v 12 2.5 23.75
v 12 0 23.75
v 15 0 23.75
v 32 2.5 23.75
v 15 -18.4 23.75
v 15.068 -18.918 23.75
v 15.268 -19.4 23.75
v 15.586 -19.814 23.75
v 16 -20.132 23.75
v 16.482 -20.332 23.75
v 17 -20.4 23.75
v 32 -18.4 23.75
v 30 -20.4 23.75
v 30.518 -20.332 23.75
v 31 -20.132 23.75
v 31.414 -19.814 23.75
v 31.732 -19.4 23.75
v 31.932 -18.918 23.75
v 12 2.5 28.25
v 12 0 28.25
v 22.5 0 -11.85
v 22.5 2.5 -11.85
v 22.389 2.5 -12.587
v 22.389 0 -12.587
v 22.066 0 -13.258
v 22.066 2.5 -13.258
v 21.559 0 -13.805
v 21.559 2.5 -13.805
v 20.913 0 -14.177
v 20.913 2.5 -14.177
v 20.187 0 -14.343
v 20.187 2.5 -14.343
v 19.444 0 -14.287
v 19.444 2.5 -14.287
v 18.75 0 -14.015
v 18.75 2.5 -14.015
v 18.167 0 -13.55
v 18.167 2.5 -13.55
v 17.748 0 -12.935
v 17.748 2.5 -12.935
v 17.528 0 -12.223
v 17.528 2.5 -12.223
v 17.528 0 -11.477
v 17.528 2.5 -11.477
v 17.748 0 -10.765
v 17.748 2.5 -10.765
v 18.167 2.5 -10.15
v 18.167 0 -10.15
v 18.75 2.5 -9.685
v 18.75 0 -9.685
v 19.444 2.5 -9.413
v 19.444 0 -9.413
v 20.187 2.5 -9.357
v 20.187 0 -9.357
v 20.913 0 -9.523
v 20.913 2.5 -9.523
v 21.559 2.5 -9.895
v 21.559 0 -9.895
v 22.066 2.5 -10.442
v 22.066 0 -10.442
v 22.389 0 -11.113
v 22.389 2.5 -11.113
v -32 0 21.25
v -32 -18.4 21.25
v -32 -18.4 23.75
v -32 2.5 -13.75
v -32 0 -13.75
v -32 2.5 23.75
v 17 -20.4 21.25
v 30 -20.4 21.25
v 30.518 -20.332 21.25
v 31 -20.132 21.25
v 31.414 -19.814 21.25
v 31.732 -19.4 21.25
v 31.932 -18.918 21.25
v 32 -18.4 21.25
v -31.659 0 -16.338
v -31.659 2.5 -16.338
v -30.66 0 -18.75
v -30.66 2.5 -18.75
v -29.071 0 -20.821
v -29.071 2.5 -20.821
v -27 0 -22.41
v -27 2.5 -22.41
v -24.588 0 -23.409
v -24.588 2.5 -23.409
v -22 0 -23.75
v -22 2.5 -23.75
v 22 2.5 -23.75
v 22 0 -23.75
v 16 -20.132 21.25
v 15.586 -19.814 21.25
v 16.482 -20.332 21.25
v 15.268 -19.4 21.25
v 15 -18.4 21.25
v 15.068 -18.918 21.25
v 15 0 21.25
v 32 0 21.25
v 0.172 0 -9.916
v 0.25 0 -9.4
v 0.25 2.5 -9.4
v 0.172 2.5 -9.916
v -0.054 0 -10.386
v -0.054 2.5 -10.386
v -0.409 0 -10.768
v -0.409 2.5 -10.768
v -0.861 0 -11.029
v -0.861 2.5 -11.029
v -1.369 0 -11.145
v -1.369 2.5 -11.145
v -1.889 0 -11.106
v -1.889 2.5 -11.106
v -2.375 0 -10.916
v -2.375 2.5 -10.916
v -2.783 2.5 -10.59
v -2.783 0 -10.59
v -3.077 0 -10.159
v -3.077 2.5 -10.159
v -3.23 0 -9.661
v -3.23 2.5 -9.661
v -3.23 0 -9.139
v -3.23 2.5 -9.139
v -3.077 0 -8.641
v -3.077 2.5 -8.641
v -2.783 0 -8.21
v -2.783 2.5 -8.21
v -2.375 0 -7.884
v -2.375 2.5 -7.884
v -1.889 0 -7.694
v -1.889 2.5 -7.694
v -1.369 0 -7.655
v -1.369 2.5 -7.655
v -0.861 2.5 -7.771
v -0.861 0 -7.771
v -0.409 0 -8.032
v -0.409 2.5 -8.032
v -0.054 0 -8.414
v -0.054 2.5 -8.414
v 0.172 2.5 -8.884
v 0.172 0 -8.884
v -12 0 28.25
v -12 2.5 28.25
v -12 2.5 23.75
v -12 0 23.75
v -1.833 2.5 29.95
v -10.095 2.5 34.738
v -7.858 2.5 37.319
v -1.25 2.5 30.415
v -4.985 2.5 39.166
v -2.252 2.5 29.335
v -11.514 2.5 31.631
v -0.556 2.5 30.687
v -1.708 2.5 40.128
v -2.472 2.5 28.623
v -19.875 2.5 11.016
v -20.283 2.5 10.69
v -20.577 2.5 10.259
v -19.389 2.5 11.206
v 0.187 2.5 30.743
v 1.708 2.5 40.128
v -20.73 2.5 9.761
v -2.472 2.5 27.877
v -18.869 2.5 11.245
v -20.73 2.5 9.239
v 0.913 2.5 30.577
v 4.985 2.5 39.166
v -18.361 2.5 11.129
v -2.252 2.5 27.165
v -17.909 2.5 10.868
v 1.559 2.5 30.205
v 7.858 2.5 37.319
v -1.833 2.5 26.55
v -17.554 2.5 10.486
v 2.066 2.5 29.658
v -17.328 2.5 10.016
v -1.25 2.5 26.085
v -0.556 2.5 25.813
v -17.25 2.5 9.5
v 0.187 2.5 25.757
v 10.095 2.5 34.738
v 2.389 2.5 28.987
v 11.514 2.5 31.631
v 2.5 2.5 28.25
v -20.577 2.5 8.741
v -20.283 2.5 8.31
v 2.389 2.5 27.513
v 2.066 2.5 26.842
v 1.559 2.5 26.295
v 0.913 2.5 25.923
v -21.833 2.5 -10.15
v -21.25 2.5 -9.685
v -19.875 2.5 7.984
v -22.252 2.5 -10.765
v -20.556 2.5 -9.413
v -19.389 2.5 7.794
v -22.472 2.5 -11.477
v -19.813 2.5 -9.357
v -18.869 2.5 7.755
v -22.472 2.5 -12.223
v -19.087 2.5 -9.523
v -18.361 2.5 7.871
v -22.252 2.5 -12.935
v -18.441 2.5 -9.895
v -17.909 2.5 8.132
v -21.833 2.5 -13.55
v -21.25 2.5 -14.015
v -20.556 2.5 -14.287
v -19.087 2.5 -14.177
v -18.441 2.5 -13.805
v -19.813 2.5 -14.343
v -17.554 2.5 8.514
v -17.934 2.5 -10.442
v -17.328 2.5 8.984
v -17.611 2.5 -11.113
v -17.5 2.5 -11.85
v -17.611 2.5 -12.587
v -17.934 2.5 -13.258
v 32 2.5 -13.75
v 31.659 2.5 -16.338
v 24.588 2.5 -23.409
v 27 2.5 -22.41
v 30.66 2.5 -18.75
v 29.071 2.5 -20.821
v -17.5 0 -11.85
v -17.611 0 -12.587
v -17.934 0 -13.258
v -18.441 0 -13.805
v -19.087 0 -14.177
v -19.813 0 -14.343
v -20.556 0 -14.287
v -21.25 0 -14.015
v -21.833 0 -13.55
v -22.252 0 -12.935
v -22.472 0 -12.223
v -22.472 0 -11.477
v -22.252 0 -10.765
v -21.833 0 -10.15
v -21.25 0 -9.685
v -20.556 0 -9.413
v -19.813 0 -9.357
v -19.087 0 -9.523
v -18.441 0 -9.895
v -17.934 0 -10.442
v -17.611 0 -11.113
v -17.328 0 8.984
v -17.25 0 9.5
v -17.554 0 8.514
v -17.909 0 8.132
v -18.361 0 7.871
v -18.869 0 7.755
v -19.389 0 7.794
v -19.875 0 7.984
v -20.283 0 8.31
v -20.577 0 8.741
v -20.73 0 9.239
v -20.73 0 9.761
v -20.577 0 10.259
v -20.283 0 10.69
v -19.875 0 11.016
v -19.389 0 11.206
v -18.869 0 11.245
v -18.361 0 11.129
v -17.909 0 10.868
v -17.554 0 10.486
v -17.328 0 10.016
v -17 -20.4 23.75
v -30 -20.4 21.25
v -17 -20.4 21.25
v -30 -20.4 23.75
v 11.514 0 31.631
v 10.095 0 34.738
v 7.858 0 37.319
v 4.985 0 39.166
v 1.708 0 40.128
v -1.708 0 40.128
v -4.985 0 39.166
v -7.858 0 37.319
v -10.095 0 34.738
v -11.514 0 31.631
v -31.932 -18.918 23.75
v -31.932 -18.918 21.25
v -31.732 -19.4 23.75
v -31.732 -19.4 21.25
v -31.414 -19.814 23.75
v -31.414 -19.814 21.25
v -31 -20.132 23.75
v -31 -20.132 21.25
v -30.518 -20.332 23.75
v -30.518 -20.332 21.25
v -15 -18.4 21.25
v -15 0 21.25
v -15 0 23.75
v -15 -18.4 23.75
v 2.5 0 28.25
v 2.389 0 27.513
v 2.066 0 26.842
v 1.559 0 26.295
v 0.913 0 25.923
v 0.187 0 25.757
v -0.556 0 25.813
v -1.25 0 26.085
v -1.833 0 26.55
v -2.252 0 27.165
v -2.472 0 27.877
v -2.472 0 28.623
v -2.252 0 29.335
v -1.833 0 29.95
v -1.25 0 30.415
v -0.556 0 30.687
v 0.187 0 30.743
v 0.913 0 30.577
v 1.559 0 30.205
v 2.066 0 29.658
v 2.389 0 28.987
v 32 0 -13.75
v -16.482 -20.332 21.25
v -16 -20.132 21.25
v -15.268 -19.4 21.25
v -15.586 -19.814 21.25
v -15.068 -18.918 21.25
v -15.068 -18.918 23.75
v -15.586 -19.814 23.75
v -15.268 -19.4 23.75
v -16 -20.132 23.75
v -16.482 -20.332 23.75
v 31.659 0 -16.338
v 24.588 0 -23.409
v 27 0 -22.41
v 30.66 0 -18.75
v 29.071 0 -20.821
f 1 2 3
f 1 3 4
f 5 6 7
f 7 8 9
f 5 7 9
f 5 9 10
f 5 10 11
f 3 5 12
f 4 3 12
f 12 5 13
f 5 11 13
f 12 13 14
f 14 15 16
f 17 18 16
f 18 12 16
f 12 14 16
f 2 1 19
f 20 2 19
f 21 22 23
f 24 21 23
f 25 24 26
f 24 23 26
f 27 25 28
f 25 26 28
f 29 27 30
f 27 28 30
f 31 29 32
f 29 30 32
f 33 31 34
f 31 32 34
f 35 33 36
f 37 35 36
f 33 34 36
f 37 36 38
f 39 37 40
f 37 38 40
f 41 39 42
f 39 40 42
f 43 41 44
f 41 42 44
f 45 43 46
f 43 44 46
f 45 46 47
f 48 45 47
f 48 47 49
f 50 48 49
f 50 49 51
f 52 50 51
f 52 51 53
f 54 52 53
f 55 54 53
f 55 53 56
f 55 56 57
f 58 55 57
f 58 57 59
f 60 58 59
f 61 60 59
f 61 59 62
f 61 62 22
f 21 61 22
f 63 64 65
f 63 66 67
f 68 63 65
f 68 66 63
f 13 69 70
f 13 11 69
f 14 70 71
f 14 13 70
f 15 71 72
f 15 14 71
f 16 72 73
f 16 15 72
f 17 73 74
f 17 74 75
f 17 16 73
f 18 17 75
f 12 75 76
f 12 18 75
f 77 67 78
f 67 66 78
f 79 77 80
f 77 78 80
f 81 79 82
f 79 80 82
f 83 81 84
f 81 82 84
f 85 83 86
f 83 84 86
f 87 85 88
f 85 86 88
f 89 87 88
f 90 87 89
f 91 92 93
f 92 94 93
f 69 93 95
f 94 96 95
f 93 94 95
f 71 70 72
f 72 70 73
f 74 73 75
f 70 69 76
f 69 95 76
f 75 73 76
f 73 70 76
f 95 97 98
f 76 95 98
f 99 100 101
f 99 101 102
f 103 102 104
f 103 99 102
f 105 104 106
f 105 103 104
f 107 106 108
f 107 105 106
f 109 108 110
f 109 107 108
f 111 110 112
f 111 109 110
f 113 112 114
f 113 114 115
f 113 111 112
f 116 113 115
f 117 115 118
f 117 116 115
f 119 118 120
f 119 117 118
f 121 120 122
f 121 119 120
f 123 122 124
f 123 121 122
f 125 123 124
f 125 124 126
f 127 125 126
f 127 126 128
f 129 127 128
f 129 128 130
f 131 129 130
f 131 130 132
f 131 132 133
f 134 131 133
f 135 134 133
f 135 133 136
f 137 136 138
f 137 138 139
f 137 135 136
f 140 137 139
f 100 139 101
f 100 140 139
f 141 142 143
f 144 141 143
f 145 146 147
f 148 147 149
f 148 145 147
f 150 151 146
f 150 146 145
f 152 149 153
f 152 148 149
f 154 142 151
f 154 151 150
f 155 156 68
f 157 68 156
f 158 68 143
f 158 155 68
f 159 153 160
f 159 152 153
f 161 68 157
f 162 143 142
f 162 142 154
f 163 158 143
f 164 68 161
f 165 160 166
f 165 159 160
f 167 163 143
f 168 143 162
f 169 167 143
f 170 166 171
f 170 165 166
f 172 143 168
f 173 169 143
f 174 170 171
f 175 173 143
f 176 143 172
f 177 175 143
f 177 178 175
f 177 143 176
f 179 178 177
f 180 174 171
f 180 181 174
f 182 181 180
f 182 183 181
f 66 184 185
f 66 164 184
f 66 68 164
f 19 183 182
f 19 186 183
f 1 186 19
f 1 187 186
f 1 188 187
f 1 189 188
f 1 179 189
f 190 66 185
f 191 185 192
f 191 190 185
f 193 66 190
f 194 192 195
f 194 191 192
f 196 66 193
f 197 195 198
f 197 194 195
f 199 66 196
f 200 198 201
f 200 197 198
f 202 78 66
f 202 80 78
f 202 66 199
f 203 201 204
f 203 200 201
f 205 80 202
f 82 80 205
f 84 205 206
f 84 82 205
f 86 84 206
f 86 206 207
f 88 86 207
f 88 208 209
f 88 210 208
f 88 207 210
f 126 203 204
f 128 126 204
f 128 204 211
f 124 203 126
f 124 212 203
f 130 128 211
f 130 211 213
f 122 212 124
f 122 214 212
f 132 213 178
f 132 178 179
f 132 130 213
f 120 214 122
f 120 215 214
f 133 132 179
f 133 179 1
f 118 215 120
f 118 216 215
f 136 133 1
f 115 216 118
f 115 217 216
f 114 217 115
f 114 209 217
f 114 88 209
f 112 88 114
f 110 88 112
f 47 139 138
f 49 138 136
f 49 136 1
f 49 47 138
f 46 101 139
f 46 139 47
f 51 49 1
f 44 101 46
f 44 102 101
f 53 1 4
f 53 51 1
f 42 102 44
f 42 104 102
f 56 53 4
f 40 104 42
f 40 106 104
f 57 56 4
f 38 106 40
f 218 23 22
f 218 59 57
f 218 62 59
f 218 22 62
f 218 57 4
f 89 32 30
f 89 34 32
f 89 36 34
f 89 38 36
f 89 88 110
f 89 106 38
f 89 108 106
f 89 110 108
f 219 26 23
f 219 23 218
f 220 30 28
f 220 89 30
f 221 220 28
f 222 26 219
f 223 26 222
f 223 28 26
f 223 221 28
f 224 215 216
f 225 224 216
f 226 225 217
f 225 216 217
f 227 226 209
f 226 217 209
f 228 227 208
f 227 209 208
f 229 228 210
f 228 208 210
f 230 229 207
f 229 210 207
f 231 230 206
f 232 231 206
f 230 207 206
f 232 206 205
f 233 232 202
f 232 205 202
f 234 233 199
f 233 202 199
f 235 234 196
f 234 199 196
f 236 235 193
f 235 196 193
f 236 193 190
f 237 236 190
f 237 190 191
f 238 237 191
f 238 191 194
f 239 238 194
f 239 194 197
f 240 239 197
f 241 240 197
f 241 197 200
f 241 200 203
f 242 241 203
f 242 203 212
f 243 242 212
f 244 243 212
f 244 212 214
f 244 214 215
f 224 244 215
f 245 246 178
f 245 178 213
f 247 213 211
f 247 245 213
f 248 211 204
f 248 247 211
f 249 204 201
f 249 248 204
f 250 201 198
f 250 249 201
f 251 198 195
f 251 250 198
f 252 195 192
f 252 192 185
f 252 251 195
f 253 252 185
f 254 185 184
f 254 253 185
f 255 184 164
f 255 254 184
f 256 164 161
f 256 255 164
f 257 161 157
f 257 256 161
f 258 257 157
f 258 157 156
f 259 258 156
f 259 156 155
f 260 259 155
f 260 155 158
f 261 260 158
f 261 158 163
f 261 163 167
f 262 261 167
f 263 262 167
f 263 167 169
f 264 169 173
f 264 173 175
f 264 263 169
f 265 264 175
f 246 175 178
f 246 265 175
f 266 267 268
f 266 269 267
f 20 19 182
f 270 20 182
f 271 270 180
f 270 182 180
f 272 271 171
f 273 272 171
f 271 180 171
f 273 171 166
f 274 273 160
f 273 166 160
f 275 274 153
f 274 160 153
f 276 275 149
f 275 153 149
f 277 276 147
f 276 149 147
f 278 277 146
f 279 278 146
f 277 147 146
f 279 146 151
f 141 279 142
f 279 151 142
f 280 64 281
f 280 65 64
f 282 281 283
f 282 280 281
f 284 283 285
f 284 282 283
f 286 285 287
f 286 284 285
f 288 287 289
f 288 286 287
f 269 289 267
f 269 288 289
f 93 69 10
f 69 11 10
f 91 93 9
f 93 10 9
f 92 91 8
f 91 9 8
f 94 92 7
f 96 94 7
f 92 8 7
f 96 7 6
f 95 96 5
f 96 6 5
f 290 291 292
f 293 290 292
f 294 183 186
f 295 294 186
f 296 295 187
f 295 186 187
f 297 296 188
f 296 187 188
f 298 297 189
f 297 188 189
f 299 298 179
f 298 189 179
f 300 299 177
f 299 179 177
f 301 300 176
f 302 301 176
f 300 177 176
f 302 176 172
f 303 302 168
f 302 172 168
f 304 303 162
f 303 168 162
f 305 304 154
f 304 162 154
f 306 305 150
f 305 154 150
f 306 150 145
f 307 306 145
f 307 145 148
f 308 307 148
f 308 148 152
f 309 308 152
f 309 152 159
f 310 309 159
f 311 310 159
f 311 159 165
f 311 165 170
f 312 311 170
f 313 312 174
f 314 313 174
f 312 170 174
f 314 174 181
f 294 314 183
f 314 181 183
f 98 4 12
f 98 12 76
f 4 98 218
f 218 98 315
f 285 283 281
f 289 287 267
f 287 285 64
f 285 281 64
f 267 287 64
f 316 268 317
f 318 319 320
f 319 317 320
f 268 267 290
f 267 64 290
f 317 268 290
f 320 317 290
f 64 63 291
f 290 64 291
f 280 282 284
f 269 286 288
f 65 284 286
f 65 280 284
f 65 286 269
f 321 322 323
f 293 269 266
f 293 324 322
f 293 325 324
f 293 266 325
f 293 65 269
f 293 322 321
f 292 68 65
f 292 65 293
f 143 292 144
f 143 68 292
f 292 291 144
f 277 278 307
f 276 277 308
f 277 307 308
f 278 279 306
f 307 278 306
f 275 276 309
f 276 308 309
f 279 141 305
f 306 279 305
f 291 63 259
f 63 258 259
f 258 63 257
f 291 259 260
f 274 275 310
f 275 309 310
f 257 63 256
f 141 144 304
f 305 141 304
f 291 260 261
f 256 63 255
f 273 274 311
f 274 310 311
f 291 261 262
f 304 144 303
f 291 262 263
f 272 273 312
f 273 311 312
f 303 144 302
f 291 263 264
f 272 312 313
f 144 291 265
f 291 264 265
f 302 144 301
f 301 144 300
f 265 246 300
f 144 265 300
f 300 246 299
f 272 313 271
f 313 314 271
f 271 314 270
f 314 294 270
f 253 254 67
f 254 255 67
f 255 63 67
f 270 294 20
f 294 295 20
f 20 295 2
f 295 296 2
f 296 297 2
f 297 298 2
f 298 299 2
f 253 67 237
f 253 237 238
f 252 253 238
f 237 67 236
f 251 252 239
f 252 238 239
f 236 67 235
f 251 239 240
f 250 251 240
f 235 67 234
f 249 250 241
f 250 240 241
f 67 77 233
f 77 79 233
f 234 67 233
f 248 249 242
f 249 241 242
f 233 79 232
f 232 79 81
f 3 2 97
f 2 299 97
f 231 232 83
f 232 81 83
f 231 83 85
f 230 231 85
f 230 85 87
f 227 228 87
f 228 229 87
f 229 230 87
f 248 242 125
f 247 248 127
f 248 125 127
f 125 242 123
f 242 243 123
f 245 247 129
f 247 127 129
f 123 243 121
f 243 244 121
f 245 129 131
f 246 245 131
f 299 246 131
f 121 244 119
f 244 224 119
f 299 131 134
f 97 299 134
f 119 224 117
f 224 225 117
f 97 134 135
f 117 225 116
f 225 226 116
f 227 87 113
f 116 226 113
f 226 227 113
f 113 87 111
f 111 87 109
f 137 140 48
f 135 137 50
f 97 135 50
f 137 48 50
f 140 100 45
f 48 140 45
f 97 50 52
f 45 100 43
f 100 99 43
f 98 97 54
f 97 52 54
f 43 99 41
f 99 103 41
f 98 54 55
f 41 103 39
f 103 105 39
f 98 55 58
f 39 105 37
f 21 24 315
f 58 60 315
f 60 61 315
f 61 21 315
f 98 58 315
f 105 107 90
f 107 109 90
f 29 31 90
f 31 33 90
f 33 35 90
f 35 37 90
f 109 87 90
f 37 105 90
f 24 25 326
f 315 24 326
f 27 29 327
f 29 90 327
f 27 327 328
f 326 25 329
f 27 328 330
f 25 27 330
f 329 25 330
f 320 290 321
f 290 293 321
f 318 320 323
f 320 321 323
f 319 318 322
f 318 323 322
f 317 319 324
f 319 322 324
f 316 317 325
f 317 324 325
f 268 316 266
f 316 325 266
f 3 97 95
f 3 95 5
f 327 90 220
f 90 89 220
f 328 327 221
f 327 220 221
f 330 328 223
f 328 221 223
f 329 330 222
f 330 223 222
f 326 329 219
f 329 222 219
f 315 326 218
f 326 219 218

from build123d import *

# Parameters (mm, degrees)
SKETCH2_W           = 64
SKETCH2_H           = 47.5
SKETCH2_R           = 1.75
BOSS_EXTRUDE1_DEPTH = 2.5
FILLET1_R           = 10
SKETCH3_R           = 2.5
BOSS_EXTRUDE2_DEPTH = 2.5
SKETCH4_W           = 17
SKETCH4_H           = 2.5
BOSS_EXTRUDE3_DEPTH = 20.4
FILLET2_R           = 2
SKETCH5_R           = 2.5
CUT_EXTRUDE1_DEPTH  = 23.9


with BuildPart() as part:
    # Sketch2 → Boss-Extrude1 (new body)
    with BuildSketch(Plane(origin=(0, 0, 0), x_dir=(1, 0, 0), z_dir=(0, 1, 0))):
        Rectangle(SKETCH2_W, SKETCH2_H)
        with Locations((-1.5, 9.4)):
            Circle(SKETCH2_R, mode=Mode.SUBTRACT)
        with Locations((-19, -9.5)):
            Circle(SKETCH2_R, mode=Mode.SUBTRACT)
    extrude(amount=BOSS_EXTRUDE1_DEPTH)

    # Fillet1
    fillet1_edges = [part.edges().sort_by_distance(p)[0] for p in [
        (-32, 1.25, -23.75),
        (32, 1.25, -23.75),
    ]]
    fillet(fillet1_edges, radius=FILLET1_R)

    # Sketch3 → Boss-Extrude2 (add)
    with BuildSketch(Plane(origin=(0, 2.5, 0), x_dir=(1, 0, 0), z_dir=(0, 1, 0))):
        with BuildLine():
            Line((-12, -28.25), (-12, -23.75))
            Line((-12, -23.75), (12, -23.75))
            Line((12, -23.75), (12, -28.25))
            ThreePointArc((12, -28.25), (0, -40.25), (-12, -28.25))
        make_face()
        with Locations((0, -28.25)):
            Circle(SKETCH3_R, mode=Mode.SUBTRACT)
    extrude(amount=-BOSS_EXTRUDE2_DEPTH)

    # Sketch4 → Boss-Extrude3 (add)
    with BuildSketch(Plane.XZ):
        with Locations((-23.5, 22.5)):
            Rectangle(SKETCH4_W, SKETCH4_H)
        with Locations((23.5, 22.5)):
            Rectangle(SKETCH4_W, SKETCH4_H)
    extrude(amount=BOSS_EXTRUDE3_DEPTH)

    # Fillet2
    fillet2_edges = [part.edges().sort_by_distance(p)[0] for p in [
        (-32, -20.4, 22.5),
        (-15, -20.4, 22.5),
        (32, -20.4, 22.5),
        (15, -20.4, 22.5),
    ]]
    fillet(fillet2_edges, radius=FILLET2_R)

    # Sketch5 → Cut-Extrude1 (cut, through all)
    with BuildSketch(Plane(origin=(0, 2.5, 0), x_dir=(1, 0, 0), z_dir=(0, 1, 0))):
        with Locations((-20, 11.85)):
            Circle(SKETCH5_R)
        with Locations((20, 11.85)):
            Circle(SKETCH5_R)
    extrude(amount=-CUT_EXTRUDE1_DEPTH, mode=Mode.SUBTRACT)


solid = part.part
